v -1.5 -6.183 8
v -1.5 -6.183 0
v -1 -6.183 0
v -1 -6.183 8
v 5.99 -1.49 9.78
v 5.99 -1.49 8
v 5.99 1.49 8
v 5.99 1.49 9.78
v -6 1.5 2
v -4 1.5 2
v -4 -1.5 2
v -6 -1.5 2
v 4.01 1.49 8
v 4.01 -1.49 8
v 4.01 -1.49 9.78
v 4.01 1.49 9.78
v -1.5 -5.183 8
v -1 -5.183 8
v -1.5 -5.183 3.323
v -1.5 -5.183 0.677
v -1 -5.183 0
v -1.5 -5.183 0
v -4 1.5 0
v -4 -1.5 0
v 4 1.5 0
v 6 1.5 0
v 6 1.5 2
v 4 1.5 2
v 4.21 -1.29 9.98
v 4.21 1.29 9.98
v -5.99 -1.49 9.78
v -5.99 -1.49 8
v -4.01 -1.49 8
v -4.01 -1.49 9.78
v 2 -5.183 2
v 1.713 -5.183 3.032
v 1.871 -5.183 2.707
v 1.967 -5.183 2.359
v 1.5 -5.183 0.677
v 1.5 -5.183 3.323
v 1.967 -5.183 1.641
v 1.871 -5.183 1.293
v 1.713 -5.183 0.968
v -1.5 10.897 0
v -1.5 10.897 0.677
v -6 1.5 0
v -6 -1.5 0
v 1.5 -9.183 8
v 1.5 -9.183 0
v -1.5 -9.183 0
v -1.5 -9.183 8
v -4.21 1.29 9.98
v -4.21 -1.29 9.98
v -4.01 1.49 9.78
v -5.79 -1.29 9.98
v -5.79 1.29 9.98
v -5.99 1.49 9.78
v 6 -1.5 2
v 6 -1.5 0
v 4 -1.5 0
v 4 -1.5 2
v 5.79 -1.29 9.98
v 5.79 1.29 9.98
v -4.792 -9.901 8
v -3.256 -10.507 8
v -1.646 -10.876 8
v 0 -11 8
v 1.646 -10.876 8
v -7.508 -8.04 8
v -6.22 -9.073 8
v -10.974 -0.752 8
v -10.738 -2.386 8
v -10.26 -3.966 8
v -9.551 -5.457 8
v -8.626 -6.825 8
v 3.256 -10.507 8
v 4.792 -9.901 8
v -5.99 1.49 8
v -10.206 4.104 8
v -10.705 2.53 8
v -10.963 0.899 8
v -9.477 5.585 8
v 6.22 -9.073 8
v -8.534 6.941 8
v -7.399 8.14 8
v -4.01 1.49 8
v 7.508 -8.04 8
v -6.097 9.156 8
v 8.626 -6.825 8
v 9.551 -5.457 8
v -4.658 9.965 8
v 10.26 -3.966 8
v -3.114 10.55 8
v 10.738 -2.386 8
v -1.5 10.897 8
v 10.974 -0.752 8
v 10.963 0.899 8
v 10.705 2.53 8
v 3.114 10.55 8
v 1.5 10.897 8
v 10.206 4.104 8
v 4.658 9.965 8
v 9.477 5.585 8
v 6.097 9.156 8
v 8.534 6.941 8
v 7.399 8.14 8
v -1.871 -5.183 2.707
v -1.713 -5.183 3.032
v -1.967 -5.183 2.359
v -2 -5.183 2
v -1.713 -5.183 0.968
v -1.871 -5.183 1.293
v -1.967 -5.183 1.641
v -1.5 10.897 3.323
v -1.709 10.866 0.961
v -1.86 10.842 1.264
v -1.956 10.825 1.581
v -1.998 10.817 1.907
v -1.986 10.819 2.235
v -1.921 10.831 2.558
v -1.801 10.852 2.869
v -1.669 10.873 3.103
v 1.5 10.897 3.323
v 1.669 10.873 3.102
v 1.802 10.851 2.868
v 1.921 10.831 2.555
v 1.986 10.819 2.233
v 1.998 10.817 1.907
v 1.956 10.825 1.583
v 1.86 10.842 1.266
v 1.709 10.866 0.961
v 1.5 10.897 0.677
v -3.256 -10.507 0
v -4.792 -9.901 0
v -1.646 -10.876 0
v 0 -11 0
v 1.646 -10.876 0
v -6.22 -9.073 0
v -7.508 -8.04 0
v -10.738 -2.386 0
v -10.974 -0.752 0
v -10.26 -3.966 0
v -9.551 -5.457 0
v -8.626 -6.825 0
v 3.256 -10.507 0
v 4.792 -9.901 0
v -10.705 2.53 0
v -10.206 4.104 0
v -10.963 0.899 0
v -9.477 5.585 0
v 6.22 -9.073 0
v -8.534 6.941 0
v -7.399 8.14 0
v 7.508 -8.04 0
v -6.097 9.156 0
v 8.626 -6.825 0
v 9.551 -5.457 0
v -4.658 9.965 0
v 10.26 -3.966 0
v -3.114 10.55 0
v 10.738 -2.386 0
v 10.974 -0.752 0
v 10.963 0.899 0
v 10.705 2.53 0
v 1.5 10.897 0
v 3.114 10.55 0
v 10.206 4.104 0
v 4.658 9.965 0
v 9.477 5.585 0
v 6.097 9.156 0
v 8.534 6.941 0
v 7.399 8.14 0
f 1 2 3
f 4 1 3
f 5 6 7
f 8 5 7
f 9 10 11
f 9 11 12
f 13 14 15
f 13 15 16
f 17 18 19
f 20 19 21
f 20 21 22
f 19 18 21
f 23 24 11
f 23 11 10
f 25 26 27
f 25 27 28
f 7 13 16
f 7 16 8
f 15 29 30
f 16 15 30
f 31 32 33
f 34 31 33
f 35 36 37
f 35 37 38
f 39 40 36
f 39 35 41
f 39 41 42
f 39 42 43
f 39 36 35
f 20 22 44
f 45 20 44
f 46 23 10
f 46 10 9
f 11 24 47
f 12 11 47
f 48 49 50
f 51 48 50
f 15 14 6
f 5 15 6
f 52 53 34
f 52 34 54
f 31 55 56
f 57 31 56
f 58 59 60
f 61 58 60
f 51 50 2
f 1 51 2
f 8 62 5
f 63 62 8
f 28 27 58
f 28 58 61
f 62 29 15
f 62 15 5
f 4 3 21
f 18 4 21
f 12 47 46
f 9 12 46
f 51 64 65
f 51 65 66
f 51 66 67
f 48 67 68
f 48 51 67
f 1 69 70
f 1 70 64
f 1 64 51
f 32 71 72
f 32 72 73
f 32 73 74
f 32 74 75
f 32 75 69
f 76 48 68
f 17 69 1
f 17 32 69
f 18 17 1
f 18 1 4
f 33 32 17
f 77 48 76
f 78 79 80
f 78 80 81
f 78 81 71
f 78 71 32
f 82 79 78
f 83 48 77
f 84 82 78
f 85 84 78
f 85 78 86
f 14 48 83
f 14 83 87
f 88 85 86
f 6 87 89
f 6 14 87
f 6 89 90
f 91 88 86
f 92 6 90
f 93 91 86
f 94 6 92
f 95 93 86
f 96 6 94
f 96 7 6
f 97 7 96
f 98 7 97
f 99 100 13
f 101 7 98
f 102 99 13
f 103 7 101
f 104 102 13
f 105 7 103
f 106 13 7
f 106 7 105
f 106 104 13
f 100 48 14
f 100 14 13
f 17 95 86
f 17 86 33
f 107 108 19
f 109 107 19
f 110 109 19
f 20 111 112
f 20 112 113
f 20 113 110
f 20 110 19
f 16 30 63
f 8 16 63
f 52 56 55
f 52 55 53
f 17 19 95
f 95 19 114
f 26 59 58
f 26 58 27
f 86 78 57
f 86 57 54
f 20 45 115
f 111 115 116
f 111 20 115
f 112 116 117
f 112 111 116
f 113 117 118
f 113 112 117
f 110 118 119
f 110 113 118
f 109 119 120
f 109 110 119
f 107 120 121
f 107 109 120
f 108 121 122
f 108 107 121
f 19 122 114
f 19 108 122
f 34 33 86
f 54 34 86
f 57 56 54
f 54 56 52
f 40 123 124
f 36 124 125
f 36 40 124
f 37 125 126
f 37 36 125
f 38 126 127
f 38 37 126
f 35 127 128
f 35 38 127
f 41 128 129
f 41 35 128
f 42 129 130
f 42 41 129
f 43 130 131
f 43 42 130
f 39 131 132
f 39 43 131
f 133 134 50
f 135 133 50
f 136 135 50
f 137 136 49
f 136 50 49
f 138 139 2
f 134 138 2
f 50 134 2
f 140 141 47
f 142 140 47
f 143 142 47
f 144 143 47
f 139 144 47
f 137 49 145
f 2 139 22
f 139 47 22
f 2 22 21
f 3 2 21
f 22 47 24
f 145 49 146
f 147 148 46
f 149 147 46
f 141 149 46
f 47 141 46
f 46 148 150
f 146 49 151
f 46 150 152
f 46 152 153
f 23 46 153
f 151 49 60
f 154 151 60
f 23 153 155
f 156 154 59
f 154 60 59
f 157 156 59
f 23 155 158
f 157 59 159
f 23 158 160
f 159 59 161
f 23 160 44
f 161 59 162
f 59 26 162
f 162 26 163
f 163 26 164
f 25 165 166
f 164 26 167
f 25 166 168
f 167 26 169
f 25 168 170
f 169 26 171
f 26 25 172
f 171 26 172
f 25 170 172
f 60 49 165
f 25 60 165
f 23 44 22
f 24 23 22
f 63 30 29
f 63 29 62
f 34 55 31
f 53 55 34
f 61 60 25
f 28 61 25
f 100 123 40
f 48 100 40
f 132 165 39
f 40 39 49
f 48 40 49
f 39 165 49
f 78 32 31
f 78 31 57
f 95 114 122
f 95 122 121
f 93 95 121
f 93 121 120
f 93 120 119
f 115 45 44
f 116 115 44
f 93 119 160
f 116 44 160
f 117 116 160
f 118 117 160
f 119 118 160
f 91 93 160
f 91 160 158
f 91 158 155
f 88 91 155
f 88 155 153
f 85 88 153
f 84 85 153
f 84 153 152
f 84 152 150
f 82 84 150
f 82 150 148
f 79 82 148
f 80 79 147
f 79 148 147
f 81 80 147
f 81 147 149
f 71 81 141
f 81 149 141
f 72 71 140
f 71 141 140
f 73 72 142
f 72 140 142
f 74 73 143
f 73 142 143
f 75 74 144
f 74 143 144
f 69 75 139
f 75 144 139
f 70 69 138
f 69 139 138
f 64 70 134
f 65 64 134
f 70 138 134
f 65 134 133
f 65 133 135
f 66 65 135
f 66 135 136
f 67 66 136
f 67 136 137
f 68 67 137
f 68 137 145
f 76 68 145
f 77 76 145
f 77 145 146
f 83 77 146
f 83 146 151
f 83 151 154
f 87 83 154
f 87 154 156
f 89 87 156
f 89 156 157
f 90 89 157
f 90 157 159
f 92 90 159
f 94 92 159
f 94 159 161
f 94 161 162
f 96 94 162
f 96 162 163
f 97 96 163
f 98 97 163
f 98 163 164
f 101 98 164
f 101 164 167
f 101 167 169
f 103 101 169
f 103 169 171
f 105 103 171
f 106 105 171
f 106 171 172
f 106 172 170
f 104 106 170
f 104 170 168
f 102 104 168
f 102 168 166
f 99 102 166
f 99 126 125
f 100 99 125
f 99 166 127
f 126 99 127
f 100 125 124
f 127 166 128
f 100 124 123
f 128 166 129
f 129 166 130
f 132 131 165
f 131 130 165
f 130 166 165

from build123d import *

# Parameters (mm, degrees)
BOSS_EXTRUDE1_DEPTH             = 8
SKETCH8_R                       = 2
PIN_HOLE_DEPTH                  = 5.183346
PIN_HOLE_DIRECTION_2_REACH      = 19.493
PIN_HOLE_DIRECTION_2_END_RADIUS = 11
SKETCH6_W                       = 2
SKETCH6_H                       = 3
CUT_EXTRUDE2_DEPTH              = 2
SKETCH7_W                       = 1.98
SKETCH7_H                       = 2.98
BOSS_EXTRUDE4_DEPTH             = 1.98
CHAMFER1_SIZE                   = 0.2


with BuildPart() as part:
    # Sketch1 → Boss-Extrude1 (new body)
    with BuildSketch(Plane.XY):
        with BuildLine():
            ThreePointArc((-1.5, 10.897247359), (0, -11), (1.5, 10.897247359))
            Line((1.5, 10.897247359), (1.5, -9.183346174))
            Line((1.5, -9.183346174), (-1.5, -9.183346174))
            Line((-1.5, -9.183346174), (-1.5, -6.183346174))
            Line((-1.5, -6.183346174), (-1, -6.183346174))
            Line((-1, -6.183346174), (-1, -5.183346174))
            Line((-1, -5.183346174), (-1.5, -5.183346174))
            Line((-1.5, -5.183346174), (-1.5, 10.897247359))
        make_face()
    extrude(amount=BOSS_EXTRUDE1_DEPTH)

    # Sketch8 → pin hole (cut)
    with BuildSketch(Plane(origin=(0, 0, 0), x_dir=(1, 0, 0), z_dir=(0, 1, 0))):
        with Locations((0, -2)):
            Circle(SKETCH8_R)
    extrude(amount=-PIN_HOLE_DEPTH, mode=Mode.SUBTRACT)

    # pin hole direction 2: up to this cylinder (the profile starts inside it)
    pin_hole_direction_2_end = Plane(origin=(0, 0, 2), z_dir=(0, 0, -1)) * Cylinder(PIN_HOLE_DIRECTION_2_END_RADIUS, 61.986, mode=Mode.PRIVATE)
    # Sketch8 → pin hole direction 2 (cut, up to the surface)
    with BuildSketch(Plane(origin=(0, 0, 0), x_dir=(1, 0, 0), z_dir=(0, 1, 0)), mode=Mode.PRIVATE) as pin_hole_direction_2_sk1:
        with Locations((0, -2)):
            Circle(SKETCH8_R)
    pin_hole_direction_2_tool1 = extrude(pin_hole_direction_2_sk1.sketch, amount=PIN_HOLE_DIRECTION_2_REACH, mode=Mode.PRIVATE) & pin_hole_direction_2_end
    add(pin_hole_direction_2_tool1.solids().sort_by_distance((0, 0, 2))[0], mode=Mode.SUBTRACT)

    # Sketch6 → Cut-Extrude2 (cut)
    with BuildSketch(Plane(origin=(0, 0, 0), x_dir=(-1, 0, 0), z_dir=(0, 0, -1))):
        with Locations((-5, 0)):
            Rectangle(SKETCH6_W, SKETCH6_H)
        with Locations((5, 0)):
            Rectangle(SKETCH6_W, SKETCH6_H)
    extrude(amount=-CUT_EXTRUDE2_DEPTH, mode=Mode.SUBTRACT)

    # Sketch7 → Boss-Extrude4 (add)
    with BuildSketch(Plane.XY.offset(8)):
        with Locations((-5, 0)):
            Rectangle(SKETCH7_W, SKETCH7_H)
        with Locations((5, 0)):
            Rectangle(SKETCH7_W, SKETCH7_H)
    extrude(amount=BOSS_EXTRUDE4_DEPTH)

    # Chamfer1
    chamfer1_edges = [part.edges().sort_by_distance(p)[0] for p in [
        (-5.99, 0, 9.98),
        (-5, -1.49, 9.98),
        (-4.01, 0, 9.98),
        (-5, 1.49, 9.98),
        (4.01, 0, 9.98),
        (5, -1.49, 9.98),
        (5.99, 0, 9.98),
        (5, 1.49, 9.98),
    ]]
    chamfer(chamfer1_edges, length=CHAMFER1_SIZE)


solid = part.part
